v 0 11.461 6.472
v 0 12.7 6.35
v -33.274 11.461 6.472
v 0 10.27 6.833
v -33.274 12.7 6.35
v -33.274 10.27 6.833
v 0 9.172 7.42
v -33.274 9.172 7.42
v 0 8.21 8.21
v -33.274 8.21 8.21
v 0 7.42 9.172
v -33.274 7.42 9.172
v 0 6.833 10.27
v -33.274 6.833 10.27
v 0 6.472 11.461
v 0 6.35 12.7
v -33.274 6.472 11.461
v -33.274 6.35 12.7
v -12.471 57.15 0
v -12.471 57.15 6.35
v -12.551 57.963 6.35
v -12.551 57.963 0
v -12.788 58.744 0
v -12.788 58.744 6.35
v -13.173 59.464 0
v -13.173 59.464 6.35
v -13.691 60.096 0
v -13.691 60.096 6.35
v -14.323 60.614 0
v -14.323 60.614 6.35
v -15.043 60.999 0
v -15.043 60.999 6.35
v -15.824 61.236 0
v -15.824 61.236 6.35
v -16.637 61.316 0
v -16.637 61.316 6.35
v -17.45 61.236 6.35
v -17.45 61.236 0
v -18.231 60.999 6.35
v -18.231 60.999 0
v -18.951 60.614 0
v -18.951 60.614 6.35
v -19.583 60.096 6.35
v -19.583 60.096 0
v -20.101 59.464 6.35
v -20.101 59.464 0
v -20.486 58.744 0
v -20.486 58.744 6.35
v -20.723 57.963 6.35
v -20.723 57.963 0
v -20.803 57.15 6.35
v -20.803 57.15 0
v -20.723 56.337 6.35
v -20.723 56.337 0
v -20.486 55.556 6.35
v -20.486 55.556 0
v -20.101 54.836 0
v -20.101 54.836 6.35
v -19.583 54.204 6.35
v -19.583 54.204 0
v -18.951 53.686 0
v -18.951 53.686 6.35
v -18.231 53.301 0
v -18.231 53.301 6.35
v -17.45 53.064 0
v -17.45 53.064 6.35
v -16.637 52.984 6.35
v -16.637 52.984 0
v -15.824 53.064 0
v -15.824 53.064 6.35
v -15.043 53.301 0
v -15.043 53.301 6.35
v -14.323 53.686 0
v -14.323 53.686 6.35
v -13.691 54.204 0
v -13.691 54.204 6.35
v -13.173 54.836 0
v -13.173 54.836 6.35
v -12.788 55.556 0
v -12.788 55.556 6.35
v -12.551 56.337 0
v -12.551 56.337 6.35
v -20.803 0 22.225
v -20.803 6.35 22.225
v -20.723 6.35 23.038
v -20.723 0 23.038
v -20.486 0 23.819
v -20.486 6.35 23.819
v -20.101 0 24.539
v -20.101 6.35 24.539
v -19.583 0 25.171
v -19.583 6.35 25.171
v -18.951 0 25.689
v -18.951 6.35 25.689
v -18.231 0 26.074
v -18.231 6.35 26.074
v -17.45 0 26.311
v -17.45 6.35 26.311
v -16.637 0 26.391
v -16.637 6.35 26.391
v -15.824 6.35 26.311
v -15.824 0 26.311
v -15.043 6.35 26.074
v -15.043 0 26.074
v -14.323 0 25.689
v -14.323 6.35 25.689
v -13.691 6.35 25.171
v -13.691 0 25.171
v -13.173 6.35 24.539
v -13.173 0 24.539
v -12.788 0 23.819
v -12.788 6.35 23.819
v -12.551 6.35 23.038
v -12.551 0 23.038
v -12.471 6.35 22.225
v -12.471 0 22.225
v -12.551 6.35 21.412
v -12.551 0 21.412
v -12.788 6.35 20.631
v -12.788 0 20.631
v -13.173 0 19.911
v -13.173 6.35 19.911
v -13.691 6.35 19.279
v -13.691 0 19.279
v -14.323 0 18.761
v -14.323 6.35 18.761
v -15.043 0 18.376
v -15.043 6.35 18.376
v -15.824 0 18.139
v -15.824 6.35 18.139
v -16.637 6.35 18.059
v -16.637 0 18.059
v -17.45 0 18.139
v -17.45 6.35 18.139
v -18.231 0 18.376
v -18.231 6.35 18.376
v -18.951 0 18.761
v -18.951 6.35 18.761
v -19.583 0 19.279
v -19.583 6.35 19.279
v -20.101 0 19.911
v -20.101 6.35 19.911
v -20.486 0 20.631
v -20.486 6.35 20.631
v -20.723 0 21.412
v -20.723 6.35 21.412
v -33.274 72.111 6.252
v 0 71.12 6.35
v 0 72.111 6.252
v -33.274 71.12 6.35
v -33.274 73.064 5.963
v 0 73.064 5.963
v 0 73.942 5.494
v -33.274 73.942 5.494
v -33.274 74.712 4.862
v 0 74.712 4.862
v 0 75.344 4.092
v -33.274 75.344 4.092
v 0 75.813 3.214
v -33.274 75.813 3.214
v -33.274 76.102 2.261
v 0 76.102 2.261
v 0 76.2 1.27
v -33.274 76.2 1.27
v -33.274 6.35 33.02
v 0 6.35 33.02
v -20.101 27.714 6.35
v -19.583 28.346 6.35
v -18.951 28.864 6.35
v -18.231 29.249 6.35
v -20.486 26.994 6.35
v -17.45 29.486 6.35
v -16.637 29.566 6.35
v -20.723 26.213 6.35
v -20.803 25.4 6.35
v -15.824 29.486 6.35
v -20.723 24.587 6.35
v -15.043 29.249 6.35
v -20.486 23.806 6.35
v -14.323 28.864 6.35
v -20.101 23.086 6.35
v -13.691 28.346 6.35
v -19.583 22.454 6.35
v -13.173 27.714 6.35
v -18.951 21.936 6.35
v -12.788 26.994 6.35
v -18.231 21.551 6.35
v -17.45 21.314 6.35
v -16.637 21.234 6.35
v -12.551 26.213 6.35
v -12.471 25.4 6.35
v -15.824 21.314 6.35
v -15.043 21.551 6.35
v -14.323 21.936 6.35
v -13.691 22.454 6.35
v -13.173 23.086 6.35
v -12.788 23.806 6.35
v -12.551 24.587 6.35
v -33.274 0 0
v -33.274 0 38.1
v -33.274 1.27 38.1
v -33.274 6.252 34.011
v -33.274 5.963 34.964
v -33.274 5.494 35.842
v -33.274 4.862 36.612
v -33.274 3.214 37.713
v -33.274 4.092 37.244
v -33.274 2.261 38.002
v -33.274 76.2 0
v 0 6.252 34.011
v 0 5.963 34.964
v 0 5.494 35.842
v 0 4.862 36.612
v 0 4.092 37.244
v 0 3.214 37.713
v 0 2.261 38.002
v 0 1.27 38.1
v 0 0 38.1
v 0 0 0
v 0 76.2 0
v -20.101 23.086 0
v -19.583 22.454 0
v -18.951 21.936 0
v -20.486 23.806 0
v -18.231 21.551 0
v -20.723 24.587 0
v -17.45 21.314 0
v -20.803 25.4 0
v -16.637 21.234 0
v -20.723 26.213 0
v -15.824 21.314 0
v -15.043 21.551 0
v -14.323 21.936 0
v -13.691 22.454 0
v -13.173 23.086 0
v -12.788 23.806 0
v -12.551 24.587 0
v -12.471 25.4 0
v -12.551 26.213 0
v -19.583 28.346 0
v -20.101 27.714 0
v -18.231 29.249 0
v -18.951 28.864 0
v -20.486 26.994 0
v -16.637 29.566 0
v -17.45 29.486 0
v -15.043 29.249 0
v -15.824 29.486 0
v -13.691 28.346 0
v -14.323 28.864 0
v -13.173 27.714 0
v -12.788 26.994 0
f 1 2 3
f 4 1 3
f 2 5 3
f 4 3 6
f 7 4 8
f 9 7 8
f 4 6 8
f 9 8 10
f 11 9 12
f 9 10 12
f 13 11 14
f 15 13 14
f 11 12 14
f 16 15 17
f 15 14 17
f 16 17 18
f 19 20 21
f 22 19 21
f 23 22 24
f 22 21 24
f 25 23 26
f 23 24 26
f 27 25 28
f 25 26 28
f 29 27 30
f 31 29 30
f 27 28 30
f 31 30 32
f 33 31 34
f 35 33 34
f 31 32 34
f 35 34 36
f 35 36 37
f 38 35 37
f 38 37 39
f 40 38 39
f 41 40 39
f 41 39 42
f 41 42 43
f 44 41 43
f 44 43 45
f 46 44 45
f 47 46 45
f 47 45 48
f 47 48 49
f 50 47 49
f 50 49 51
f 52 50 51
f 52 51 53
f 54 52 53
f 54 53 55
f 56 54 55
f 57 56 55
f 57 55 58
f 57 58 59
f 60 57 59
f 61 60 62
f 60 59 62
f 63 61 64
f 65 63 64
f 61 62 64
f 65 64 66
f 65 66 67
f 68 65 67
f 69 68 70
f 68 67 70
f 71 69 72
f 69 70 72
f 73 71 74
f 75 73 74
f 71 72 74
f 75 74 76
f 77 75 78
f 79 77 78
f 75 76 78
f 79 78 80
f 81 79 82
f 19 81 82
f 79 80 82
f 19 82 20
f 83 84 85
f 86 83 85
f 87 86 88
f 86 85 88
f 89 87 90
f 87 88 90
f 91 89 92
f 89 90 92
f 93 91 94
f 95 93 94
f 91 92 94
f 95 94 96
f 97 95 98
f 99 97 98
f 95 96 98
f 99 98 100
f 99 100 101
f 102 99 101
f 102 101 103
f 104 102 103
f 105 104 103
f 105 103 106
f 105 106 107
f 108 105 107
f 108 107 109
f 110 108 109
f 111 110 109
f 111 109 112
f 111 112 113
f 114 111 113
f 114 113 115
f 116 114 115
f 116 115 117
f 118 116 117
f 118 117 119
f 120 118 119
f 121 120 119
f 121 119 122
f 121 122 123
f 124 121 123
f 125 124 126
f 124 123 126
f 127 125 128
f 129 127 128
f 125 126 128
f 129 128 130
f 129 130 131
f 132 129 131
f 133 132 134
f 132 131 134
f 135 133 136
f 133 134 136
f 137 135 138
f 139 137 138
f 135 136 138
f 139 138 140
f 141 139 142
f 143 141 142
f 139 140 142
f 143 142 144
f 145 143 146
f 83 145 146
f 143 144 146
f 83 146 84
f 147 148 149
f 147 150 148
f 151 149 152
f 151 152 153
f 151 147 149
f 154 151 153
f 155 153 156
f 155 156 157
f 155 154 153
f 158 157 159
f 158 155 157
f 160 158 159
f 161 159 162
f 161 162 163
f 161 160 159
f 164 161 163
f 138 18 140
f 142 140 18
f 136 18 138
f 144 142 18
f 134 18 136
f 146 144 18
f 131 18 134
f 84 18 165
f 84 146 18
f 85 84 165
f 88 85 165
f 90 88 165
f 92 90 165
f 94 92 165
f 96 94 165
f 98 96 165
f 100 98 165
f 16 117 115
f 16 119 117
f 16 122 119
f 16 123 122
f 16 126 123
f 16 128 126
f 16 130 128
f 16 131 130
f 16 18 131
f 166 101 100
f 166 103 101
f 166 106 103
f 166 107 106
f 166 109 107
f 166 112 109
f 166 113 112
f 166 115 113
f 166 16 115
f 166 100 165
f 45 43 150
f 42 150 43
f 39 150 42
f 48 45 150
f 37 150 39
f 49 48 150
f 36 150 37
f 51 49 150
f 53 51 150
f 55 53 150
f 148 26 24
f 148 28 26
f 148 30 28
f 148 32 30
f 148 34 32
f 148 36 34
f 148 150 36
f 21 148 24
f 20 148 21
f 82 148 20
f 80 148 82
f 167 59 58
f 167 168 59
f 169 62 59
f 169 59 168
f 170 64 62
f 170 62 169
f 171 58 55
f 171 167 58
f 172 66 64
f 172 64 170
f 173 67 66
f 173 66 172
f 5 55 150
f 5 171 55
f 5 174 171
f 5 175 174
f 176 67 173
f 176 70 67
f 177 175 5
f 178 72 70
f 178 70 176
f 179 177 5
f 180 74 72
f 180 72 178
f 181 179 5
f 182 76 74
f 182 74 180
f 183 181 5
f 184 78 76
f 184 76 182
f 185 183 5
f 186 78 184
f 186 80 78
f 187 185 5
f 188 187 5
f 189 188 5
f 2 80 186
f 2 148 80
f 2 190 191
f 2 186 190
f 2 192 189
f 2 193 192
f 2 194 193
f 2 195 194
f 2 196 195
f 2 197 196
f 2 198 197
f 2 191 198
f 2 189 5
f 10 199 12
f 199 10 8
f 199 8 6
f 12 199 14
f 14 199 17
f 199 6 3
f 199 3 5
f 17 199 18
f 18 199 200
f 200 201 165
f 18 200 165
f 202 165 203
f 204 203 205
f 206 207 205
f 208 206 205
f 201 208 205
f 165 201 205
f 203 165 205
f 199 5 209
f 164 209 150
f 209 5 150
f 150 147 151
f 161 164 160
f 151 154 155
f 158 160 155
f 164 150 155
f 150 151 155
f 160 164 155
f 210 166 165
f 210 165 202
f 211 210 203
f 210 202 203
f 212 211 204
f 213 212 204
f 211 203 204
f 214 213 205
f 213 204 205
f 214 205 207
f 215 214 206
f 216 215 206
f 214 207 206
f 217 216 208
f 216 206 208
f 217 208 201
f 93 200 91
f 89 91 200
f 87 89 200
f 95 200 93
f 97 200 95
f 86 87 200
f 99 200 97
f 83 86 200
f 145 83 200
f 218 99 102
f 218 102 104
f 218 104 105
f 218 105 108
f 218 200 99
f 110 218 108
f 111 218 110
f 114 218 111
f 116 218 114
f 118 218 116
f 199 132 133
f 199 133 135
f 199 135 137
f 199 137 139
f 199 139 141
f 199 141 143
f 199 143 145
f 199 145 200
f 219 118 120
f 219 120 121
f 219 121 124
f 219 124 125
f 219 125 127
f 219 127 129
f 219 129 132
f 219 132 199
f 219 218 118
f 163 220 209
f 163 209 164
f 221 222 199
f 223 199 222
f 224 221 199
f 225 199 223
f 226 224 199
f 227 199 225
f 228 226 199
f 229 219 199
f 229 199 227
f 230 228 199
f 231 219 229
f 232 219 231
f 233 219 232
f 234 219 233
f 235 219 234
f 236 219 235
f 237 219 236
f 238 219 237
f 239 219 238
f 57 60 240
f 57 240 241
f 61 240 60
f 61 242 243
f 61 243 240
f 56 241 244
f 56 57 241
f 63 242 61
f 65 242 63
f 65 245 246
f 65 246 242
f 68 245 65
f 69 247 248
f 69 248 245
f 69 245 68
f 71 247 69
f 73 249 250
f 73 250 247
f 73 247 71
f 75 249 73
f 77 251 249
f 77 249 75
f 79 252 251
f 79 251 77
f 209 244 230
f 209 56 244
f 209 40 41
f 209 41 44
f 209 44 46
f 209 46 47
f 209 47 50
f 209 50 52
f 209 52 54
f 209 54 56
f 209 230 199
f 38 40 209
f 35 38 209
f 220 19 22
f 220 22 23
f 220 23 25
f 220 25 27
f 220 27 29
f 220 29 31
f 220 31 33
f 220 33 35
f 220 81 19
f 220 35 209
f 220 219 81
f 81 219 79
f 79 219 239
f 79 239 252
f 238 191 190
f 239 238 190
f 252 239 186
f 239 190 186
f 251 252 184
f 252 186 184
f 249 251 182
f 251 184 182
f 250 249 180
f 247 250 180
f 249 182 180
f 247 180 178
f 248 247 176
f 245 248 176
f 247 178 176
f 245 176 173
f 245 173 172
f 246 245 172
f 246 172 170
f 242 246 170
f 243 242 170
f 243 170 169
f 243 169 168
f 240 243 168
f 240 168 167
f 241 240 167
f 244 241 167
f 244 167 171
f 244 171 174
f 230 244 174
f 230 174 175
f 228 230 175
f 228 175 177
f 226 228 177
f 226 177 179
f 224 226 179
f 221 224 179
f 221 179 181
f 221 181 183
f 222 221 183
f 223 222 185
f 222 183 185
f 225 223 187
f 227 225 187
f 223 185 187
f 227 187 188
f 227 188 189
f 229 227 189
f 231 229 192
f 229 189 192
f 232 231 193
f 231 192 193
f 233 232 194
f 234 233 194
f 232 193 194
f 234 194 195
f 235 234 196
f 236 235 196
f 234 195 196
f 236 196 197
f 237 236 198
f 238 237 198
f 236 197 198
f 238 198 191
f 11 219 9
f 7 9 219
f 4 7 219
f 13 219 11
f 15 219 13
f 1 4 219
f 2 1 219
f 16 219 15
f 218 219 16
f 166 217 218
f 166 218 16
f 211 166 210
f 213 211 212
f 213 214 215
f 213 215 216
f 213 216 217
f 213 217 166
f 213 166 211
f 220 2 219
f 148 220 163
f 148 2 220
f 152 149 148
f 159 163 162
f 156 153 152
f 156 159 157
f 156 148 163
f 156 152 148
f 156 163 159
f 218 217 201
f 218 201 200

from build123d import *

# Parameters (mm, degrees)
F1_DEPTH = 33.274
F2_R     = 6.35
F3_R     = 5.08
F4_R     = 4.1656
F5_DEPTH = 6.351
F6_R     = 4.1656
F7_DEPTH = 6.351


with BuildPart() as f1:
    # F0 (on Right) → F1 (new body)
    with BuildSketch(Plane.YZ):
        Polygon((0, 38.1), (0, 0), (76.2, 0), (76.2, 6.35), (6.35, 6.35), (6.35, 38.1), align=None)
    extrude(amount=-F1_DEPTH)

    # F2
    f2_edges = [f1.edges().sort_by_distance(p)[0] for p in [
        (-16.637, 6.35, 6.35),
    ]]
    fillet(f2_edges, radius=F2_R)

    # F3
    f3_edges = [f1.edges().sort_by_distance(p)[0] for p in [
        (-16.637, 6.35, 38.1),
        (-16.637, 76.2, 6.35),
    ]]
    fillet(f3_edges, radius=F3_R)

    # F4 (on face) → F5 (cut, through all)
    with BuildSketch(Plane(origin=(0, 6.35, 0), x_dir=(-1, 0, 0), z_dir=(0, 1, 0))):
        with Locations((16.637, 22.225)):
            Circle(F4_R)
    extrude(amount=-F5_DEPTH, mode=Mode.SUBTRACT)

    # F6 (on face) → F7 (cut, through all)
    with BuildSketch(Plane.XY.offset(6.35)):
        with Locations((-16.637, 25.4)):
            Circle(F6_R)
        with Locations((-16.637, 57.15)):
            Circle(F6_R)
    extrude(amount=-F7_DEPTH, mode=Mode.SUBTRACT)


solid = f1.part
